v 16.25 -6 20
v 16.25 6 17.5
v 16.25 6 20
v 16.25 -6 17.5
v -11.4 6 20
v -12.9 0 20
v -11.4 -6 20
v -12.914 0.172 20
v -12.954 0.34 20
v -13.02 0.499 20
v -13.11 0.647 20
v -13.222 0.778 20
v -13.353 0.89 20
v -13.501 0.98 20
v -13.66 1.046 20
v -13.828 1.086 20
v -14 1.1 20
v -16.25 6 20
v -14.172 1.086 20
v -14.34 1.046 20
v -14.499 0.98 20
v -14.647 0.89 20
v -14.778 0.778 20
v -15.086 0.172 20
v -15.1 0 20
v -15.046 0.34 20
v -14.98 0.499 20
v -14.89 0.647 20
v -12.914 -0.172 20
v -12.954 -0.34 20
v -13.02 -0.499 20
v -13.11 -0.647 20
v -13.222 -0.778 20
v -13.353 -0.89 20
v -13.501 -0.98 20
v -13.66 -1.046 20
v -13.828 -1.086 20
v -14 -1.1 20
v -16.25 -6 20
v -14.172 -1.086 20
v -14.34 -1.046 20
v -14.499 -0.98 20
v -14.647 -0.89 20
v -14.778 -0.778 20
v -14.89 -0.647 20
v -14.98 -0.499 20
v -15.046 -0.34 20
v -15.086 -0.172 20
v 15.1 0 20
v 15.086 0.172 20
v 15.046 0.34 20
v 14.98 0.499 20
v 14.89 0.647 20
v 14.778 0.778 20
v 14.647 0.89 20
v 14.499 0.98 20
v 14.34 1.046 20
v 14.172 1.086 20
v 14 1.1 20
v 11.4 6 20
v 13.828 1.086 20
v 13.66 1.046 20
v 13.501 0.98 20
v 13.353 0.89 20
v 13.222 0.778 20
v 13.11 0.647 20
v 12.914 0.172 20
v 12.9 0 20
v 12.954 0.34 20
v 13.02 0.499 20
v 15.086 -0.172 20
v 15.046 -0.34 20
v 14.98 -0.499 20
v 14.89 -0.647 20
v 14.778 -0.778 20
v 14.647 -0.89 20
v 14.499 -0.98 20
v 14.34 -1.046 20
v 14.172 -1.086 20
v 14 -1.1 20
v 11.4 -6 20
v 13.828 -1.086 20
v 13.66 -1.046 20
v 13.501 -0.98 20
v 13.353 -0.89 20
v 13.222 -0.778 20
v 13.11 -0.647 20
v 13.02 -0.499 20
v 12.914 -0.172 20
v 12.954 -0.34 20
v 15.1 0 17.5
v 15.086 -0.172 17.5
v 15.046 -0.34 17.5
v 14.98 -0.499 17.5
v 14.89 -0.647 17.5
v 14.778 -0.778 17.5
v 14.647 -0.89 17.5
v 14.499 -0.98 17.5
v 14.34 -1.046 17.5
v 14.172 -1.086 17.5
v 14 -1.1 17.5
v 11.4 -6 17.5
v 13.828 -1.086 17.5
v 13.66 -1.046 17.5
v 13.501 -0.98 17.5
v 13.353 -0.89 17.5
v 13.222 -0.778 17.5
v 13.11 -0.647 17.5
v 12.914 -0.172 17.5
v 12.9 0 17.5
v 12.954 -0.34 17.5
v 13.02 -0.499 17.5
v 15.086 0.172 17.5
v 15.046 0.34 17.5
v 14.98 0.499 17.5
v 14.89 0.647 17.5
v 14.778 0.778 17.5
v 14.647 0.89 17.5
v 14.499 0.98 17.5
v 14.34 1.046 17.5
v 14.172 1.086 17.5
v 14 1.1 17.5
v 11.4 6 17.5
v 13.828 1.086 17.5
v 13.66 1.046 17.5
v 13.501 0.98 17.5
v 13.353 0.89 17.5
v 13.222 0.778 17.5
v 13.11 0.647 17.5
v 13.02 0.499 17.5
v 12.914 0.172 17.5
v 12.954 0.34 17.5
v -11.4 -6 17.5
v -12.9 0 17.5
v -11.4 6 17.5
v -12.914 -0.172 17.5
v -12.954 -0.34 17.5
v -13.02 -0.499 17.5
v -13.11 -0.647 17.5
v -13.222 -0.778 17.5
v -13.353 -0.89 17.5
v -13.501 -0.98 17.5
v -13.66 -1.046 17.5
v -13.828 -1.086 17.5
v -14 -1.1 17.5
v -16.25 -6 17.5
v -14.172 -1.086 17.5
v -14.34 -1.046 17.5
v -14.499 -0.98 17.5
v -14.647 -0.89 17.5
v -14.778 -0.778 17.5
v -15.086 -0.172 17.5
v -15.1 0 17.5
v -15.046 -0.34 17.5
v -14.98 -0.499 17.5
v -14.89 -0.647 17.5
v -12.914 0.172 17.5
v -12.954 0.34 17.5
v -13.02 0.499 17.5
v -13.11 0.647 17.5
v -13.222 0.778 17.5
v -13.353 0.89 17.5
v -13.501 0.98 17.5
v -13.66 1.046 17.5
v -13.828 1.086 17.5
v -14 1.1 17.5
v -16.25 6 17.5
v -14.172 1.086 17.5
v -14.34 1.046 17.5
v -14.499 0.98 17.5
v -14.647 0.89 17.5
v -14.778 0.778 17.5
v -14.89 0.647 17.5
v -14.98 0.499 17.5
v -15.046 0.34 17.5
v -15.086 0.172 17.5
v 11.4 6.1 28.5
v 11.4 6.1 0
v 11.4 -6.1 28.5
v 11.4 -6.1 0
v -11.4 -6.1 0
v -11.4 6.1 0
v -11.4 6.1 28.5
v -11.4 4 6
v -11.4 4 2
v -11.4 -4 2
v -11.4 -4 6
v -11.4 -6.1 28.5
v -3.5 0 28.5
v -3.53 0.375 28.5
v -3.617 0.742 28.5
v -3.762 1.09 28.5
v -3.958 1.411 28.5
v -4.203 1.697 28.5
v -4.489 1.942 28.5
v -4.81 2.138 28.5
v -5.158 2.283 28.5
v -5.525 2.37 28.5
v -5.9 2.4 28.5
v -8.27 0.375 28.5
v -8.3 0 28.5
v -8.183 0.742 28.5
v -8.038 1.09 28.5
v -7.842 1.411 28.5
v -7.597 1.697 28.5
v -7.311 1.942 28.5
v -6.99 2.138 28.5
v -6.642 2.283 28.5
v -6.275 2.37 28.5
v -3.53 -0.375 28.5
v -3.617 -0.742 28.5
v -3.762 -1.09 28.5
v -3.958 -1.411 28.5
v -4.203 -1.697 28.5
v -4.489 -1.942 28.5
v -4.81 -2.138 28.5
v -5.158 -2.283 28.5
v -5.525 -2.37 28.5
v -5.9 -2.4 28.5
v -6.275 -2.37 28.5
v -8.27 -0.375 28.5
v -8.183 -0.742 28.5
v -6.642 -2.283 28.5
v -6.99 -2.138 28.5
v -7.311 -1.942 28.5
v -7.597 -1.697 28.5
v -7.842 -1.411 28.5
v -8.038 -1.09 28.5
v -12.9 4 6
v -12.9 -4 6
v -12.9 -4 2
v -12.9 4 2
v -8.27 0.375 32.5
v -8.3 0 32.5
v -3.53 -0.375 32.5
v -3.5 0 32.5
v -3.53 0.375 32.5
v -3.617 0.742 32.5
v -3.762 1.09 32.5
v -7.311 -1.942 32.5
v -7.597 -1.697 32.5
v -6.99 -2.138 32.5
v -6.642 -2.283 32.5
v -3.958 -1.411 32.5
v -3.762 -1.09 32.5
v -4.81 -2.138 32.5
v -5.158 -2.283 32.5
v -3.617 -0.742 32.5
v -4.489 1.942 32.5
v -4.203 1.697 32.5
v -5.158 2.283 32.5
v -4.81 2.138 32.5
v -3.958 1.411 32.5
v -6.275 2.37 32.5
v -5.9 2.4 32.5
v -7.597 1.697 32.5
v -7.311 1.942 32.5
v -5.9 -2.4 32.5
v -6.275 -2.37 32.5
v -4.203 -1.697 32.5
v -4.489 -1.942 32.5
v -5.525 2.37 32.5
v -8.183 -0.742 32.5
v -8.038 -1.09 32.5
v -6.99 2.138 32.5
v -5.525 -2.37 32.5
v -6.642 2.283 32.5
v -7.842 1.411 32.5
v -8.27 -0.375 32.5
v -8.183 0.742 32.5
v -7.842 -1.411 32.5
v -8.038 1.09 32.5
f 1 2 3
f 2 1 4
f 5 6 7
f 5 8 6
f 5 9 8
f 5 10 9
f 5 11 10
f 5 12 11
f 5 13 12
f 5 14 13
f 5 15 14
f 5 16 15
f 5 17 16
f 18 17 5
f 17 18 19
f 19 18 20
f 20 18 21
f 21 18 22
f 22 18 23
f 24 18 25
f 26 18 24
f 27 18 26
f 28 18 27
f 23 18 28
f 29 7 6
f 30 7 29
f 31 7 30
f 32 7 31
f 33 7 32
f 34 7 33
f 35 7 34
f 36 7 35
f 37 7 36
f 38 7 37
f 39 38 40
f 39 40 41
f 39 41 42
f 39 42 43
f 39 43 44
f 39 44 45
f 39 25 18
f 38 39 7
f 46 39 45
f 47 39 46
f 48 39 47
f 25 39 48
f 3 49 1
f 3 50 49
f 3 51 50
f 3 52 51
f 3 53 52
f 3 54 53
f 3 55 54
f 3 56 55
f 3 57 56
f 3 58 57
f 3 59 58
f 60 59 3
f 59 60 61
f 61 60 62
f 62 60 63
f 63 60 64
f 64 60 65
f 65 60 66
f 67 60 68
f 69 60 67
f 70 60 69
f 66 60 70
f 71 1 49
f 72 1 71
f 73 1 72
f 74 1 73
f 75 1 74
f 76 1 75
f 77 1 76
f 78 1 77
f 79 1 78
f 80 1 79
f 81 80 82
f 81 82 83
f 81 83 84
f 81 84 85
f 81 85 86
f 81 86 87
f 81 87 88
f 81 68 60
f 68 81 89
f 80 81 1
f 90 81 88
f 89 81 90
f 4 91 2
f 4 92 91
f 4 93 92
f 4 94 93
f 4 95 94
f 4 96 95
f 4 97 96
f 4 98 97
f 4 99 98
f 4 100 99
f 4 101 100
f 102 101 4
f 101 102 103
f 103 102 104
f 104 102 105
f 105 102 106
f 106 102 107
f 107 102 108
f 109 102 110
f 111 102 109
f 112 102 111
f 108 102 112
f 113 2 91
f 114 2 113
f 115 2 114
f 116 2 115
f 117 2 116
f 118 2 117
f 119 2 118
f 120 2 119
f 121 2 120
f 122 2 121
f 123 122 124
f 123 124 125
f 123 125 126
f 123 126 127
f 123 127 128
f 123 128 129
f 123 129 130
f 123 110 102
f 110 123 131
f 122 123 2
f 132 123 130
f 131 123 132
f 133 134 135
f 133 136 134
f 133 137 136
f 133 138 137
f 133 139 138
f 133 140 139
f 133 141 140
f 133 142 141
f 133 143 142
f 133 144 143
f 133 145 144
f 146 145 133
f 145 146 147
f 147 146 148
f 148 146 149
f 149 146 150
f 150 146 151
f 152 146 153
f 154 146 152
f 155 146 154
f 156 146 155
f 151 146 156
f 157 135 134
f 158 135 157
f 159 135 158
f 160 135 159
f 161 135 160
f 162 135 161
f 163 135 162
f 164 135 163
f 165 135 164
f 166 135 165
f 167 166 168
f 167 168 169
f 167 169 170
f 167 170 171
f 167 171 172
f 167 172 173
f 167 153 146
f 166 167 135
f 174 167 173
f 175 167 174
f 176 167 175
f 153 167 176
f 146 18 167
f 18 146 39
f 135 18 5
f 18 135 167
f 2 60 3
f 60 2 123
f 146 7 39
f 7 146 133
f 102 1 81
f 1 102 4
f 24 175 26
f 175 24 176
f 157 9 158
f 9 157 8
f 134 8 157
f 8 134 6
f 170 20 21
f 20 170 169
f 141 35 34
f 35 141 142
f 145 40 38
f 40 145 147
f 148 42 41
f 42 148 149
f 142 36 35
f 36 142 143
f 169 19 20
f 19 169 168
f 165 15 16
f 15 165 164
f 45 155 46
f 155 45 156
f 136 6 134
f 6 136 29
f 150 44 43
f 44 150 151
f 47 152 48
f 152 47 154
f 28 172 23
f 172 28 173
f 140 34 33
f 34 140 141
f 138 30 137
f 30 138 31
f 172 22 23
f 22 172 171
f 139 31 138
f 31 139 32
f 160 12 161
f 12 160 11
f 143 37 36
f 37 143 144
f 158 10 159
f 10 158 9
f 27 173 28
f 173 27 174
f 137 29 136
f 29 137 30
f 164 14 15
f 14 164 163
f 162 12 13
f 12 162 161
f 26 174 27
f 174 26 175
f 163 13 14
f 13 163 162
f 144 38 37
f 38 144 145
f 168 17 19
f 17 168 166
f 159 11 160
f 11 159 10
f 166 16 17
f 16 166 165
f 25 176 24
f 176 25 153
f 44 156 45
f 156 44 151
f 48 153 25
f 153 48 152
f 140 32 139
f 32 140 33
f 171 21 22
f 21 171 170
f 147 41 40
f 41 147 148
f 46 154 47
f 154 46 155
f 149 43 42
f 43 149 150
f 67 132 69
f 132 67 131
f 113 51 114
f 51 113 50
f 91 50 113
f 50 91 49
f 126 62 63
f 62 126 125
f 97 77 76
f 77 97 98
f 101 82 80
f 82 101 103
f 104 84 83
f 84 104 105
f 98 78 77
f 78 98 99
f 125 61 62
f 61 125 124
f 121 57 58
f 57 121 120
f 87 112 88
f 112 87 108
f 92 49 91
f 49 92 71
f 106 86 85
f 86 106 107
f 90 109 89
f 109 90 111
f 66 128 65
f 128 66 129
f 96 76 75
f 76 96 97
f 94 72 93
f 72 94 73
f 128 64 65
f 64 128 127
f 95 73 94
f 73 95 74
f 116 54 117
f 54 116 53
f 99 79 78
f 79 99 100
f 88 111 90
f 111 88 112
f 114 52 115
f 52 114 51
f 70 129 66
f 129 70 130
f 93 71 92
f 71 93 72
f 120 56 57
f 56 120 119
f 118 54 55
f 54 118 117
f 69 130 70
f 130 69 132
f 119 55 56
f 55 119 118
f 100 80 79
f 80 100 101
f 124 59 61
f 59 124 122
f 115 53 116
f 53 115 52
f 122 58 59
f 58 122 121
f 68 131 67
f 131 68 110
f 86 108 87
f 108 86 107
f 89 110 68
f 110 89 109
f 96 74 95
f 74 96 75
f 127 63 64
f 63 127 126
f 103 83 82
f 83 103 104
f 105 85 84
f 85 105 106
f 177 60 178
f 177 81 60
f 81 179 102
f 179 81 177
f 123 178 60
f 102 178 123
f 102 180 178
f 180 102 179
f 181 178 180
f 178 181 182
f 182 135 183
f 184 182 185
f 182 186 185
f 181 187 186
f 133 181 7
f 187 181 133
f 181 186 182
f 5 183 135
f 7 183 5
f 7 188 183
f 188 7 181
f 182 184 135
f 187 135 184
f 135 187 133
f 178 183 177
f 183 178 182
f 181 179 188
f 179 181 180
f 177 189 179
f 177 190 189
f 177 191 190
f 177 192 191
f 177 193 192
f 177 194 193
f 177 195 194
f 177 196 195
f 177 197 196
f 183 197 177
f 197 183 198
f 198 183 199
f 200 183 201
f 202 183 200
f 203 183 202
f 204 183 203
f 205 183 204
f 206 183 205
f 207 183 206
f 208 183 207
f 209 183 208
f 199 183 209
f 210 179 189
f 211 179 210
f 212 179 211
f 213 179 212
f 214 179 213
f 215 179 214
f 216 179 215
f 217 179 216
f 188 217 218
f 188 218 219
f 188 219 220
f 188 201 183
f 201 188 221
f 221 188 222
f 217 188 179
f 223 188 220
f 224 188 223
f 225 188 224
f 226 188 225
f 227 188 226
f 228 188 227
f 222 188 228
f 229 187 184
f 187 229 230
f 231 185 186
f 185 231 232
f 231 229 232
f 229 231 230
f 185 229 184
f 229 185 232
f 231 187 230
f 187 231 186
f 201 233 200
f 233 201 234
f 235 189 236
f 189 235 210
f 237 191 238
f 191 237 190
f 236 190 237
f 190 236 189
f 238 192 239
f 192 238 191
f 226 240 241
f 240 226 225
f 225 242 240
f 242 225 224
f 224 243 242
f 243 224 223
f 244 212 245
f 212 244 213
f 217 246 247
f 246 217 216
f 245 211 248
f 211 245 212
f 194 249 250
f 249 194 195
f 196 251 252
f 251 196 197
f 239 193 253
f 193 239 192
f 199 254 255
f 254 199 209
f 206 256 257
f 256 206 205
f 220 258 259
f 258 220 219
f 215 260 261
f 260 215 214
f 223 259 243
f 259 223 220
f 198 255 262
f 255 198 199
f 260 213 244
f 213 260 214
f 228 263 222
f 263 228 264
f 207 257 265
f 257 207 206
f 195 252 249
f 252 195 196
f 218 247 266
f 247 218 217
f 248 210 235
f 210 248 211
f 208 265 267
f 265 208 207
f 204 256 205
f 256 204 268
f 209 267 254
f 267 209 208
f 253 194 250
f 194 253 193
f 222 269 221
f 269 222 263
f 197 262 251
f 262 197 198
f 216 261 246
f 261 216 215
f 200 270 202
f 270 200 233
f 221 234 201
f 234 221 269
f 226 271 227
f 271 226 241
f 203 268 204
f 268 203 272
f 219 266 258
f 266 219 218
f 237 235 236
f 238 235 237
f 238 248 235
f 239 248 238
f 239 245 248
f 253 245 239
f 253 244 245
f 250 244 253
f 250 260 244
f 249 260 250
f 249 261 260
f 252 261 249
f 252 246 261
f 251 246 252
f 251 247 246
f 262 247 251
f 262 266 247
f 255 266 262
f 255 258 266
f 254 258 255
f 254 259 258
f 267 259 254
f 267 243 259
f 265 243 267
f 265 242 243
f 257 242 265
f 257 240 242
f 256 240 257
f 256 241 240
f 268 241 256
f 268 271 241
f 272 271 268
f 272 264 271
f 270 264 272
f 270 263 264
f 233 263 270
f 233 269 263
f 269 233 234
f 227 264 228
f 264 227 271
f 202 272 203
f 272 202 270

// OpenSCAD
// ===================================================================
// MG90S 9g 金属齿微型舵机 (Standard Micro Servo Model)
// 工业标准 1:1 CAD 实体模型
// ===================================================================

$fn = 40;

module mg90s_servo() {
    // 材质颜色标识: 深灰色主体 + 黄铜色齿轮输出轴
    color([0.2, 0.2, 0.25]) {
        // 1. 舵机主体外壳 (Main Body: 22.8 x 12.2 x 22.7 mm 下箱体)
        translate([-22.8/2, -12.2/2, 0])
            cube([22.8, 12.2, 22.7]);
        
        // 2. 齿轮箱顶部阶梯盖 (Top Gearbox: 22.8 x 12.2 x 5.8 mm)
        translate([-22.8/2, -12.2/2, 22.7])
            cube([22.8, 12.2, 5.8]);

        // 3. 安装固定耳 (Mounting Ears: 总跨度 32.5mm，位于高 Z=17.5mm 处，厚度 2.5mm)
        difference() {
            translate([-32.5/2, -12.0/2, 17.5])
                cube([32.5, 12.0, 2.5]);
            
            // 两侧 M2 安装孔 (孔距 28.0mm, 孔径 Ø2.2mm)
            translate([-28.0/2, 0, 16])
                cylinder(d=2.2, h=5);
            translate([28.0/2, 0, 16])
                cylinder(d=2.2, h=5);
        }

        // 4. 电源信号引出线护套 (Wire exit at bottom corner)
        translate([-22.8/2 - 1.5, -4, 2])
            cube([2.0, 8, 4]);
    }

    // 5. 黄铜色金属输出齿轮轴 (25T Spline Output Shaft: 偏心 5.5mm，外径 Ø4.8mm，高 4.0mm)
    color([0.85, 0.7, 0.25]) {
        translate([-22.8/2 + 5.5, 0, 28.5]) {
            cylinder(d=4.8, h=4.0);
            // 顶端平垫齿圈台阶
            translate([0, 0, -1.0])
                cylinder(d=6.5, h=1.0);
        }
    }
}

mg90s_servo();
